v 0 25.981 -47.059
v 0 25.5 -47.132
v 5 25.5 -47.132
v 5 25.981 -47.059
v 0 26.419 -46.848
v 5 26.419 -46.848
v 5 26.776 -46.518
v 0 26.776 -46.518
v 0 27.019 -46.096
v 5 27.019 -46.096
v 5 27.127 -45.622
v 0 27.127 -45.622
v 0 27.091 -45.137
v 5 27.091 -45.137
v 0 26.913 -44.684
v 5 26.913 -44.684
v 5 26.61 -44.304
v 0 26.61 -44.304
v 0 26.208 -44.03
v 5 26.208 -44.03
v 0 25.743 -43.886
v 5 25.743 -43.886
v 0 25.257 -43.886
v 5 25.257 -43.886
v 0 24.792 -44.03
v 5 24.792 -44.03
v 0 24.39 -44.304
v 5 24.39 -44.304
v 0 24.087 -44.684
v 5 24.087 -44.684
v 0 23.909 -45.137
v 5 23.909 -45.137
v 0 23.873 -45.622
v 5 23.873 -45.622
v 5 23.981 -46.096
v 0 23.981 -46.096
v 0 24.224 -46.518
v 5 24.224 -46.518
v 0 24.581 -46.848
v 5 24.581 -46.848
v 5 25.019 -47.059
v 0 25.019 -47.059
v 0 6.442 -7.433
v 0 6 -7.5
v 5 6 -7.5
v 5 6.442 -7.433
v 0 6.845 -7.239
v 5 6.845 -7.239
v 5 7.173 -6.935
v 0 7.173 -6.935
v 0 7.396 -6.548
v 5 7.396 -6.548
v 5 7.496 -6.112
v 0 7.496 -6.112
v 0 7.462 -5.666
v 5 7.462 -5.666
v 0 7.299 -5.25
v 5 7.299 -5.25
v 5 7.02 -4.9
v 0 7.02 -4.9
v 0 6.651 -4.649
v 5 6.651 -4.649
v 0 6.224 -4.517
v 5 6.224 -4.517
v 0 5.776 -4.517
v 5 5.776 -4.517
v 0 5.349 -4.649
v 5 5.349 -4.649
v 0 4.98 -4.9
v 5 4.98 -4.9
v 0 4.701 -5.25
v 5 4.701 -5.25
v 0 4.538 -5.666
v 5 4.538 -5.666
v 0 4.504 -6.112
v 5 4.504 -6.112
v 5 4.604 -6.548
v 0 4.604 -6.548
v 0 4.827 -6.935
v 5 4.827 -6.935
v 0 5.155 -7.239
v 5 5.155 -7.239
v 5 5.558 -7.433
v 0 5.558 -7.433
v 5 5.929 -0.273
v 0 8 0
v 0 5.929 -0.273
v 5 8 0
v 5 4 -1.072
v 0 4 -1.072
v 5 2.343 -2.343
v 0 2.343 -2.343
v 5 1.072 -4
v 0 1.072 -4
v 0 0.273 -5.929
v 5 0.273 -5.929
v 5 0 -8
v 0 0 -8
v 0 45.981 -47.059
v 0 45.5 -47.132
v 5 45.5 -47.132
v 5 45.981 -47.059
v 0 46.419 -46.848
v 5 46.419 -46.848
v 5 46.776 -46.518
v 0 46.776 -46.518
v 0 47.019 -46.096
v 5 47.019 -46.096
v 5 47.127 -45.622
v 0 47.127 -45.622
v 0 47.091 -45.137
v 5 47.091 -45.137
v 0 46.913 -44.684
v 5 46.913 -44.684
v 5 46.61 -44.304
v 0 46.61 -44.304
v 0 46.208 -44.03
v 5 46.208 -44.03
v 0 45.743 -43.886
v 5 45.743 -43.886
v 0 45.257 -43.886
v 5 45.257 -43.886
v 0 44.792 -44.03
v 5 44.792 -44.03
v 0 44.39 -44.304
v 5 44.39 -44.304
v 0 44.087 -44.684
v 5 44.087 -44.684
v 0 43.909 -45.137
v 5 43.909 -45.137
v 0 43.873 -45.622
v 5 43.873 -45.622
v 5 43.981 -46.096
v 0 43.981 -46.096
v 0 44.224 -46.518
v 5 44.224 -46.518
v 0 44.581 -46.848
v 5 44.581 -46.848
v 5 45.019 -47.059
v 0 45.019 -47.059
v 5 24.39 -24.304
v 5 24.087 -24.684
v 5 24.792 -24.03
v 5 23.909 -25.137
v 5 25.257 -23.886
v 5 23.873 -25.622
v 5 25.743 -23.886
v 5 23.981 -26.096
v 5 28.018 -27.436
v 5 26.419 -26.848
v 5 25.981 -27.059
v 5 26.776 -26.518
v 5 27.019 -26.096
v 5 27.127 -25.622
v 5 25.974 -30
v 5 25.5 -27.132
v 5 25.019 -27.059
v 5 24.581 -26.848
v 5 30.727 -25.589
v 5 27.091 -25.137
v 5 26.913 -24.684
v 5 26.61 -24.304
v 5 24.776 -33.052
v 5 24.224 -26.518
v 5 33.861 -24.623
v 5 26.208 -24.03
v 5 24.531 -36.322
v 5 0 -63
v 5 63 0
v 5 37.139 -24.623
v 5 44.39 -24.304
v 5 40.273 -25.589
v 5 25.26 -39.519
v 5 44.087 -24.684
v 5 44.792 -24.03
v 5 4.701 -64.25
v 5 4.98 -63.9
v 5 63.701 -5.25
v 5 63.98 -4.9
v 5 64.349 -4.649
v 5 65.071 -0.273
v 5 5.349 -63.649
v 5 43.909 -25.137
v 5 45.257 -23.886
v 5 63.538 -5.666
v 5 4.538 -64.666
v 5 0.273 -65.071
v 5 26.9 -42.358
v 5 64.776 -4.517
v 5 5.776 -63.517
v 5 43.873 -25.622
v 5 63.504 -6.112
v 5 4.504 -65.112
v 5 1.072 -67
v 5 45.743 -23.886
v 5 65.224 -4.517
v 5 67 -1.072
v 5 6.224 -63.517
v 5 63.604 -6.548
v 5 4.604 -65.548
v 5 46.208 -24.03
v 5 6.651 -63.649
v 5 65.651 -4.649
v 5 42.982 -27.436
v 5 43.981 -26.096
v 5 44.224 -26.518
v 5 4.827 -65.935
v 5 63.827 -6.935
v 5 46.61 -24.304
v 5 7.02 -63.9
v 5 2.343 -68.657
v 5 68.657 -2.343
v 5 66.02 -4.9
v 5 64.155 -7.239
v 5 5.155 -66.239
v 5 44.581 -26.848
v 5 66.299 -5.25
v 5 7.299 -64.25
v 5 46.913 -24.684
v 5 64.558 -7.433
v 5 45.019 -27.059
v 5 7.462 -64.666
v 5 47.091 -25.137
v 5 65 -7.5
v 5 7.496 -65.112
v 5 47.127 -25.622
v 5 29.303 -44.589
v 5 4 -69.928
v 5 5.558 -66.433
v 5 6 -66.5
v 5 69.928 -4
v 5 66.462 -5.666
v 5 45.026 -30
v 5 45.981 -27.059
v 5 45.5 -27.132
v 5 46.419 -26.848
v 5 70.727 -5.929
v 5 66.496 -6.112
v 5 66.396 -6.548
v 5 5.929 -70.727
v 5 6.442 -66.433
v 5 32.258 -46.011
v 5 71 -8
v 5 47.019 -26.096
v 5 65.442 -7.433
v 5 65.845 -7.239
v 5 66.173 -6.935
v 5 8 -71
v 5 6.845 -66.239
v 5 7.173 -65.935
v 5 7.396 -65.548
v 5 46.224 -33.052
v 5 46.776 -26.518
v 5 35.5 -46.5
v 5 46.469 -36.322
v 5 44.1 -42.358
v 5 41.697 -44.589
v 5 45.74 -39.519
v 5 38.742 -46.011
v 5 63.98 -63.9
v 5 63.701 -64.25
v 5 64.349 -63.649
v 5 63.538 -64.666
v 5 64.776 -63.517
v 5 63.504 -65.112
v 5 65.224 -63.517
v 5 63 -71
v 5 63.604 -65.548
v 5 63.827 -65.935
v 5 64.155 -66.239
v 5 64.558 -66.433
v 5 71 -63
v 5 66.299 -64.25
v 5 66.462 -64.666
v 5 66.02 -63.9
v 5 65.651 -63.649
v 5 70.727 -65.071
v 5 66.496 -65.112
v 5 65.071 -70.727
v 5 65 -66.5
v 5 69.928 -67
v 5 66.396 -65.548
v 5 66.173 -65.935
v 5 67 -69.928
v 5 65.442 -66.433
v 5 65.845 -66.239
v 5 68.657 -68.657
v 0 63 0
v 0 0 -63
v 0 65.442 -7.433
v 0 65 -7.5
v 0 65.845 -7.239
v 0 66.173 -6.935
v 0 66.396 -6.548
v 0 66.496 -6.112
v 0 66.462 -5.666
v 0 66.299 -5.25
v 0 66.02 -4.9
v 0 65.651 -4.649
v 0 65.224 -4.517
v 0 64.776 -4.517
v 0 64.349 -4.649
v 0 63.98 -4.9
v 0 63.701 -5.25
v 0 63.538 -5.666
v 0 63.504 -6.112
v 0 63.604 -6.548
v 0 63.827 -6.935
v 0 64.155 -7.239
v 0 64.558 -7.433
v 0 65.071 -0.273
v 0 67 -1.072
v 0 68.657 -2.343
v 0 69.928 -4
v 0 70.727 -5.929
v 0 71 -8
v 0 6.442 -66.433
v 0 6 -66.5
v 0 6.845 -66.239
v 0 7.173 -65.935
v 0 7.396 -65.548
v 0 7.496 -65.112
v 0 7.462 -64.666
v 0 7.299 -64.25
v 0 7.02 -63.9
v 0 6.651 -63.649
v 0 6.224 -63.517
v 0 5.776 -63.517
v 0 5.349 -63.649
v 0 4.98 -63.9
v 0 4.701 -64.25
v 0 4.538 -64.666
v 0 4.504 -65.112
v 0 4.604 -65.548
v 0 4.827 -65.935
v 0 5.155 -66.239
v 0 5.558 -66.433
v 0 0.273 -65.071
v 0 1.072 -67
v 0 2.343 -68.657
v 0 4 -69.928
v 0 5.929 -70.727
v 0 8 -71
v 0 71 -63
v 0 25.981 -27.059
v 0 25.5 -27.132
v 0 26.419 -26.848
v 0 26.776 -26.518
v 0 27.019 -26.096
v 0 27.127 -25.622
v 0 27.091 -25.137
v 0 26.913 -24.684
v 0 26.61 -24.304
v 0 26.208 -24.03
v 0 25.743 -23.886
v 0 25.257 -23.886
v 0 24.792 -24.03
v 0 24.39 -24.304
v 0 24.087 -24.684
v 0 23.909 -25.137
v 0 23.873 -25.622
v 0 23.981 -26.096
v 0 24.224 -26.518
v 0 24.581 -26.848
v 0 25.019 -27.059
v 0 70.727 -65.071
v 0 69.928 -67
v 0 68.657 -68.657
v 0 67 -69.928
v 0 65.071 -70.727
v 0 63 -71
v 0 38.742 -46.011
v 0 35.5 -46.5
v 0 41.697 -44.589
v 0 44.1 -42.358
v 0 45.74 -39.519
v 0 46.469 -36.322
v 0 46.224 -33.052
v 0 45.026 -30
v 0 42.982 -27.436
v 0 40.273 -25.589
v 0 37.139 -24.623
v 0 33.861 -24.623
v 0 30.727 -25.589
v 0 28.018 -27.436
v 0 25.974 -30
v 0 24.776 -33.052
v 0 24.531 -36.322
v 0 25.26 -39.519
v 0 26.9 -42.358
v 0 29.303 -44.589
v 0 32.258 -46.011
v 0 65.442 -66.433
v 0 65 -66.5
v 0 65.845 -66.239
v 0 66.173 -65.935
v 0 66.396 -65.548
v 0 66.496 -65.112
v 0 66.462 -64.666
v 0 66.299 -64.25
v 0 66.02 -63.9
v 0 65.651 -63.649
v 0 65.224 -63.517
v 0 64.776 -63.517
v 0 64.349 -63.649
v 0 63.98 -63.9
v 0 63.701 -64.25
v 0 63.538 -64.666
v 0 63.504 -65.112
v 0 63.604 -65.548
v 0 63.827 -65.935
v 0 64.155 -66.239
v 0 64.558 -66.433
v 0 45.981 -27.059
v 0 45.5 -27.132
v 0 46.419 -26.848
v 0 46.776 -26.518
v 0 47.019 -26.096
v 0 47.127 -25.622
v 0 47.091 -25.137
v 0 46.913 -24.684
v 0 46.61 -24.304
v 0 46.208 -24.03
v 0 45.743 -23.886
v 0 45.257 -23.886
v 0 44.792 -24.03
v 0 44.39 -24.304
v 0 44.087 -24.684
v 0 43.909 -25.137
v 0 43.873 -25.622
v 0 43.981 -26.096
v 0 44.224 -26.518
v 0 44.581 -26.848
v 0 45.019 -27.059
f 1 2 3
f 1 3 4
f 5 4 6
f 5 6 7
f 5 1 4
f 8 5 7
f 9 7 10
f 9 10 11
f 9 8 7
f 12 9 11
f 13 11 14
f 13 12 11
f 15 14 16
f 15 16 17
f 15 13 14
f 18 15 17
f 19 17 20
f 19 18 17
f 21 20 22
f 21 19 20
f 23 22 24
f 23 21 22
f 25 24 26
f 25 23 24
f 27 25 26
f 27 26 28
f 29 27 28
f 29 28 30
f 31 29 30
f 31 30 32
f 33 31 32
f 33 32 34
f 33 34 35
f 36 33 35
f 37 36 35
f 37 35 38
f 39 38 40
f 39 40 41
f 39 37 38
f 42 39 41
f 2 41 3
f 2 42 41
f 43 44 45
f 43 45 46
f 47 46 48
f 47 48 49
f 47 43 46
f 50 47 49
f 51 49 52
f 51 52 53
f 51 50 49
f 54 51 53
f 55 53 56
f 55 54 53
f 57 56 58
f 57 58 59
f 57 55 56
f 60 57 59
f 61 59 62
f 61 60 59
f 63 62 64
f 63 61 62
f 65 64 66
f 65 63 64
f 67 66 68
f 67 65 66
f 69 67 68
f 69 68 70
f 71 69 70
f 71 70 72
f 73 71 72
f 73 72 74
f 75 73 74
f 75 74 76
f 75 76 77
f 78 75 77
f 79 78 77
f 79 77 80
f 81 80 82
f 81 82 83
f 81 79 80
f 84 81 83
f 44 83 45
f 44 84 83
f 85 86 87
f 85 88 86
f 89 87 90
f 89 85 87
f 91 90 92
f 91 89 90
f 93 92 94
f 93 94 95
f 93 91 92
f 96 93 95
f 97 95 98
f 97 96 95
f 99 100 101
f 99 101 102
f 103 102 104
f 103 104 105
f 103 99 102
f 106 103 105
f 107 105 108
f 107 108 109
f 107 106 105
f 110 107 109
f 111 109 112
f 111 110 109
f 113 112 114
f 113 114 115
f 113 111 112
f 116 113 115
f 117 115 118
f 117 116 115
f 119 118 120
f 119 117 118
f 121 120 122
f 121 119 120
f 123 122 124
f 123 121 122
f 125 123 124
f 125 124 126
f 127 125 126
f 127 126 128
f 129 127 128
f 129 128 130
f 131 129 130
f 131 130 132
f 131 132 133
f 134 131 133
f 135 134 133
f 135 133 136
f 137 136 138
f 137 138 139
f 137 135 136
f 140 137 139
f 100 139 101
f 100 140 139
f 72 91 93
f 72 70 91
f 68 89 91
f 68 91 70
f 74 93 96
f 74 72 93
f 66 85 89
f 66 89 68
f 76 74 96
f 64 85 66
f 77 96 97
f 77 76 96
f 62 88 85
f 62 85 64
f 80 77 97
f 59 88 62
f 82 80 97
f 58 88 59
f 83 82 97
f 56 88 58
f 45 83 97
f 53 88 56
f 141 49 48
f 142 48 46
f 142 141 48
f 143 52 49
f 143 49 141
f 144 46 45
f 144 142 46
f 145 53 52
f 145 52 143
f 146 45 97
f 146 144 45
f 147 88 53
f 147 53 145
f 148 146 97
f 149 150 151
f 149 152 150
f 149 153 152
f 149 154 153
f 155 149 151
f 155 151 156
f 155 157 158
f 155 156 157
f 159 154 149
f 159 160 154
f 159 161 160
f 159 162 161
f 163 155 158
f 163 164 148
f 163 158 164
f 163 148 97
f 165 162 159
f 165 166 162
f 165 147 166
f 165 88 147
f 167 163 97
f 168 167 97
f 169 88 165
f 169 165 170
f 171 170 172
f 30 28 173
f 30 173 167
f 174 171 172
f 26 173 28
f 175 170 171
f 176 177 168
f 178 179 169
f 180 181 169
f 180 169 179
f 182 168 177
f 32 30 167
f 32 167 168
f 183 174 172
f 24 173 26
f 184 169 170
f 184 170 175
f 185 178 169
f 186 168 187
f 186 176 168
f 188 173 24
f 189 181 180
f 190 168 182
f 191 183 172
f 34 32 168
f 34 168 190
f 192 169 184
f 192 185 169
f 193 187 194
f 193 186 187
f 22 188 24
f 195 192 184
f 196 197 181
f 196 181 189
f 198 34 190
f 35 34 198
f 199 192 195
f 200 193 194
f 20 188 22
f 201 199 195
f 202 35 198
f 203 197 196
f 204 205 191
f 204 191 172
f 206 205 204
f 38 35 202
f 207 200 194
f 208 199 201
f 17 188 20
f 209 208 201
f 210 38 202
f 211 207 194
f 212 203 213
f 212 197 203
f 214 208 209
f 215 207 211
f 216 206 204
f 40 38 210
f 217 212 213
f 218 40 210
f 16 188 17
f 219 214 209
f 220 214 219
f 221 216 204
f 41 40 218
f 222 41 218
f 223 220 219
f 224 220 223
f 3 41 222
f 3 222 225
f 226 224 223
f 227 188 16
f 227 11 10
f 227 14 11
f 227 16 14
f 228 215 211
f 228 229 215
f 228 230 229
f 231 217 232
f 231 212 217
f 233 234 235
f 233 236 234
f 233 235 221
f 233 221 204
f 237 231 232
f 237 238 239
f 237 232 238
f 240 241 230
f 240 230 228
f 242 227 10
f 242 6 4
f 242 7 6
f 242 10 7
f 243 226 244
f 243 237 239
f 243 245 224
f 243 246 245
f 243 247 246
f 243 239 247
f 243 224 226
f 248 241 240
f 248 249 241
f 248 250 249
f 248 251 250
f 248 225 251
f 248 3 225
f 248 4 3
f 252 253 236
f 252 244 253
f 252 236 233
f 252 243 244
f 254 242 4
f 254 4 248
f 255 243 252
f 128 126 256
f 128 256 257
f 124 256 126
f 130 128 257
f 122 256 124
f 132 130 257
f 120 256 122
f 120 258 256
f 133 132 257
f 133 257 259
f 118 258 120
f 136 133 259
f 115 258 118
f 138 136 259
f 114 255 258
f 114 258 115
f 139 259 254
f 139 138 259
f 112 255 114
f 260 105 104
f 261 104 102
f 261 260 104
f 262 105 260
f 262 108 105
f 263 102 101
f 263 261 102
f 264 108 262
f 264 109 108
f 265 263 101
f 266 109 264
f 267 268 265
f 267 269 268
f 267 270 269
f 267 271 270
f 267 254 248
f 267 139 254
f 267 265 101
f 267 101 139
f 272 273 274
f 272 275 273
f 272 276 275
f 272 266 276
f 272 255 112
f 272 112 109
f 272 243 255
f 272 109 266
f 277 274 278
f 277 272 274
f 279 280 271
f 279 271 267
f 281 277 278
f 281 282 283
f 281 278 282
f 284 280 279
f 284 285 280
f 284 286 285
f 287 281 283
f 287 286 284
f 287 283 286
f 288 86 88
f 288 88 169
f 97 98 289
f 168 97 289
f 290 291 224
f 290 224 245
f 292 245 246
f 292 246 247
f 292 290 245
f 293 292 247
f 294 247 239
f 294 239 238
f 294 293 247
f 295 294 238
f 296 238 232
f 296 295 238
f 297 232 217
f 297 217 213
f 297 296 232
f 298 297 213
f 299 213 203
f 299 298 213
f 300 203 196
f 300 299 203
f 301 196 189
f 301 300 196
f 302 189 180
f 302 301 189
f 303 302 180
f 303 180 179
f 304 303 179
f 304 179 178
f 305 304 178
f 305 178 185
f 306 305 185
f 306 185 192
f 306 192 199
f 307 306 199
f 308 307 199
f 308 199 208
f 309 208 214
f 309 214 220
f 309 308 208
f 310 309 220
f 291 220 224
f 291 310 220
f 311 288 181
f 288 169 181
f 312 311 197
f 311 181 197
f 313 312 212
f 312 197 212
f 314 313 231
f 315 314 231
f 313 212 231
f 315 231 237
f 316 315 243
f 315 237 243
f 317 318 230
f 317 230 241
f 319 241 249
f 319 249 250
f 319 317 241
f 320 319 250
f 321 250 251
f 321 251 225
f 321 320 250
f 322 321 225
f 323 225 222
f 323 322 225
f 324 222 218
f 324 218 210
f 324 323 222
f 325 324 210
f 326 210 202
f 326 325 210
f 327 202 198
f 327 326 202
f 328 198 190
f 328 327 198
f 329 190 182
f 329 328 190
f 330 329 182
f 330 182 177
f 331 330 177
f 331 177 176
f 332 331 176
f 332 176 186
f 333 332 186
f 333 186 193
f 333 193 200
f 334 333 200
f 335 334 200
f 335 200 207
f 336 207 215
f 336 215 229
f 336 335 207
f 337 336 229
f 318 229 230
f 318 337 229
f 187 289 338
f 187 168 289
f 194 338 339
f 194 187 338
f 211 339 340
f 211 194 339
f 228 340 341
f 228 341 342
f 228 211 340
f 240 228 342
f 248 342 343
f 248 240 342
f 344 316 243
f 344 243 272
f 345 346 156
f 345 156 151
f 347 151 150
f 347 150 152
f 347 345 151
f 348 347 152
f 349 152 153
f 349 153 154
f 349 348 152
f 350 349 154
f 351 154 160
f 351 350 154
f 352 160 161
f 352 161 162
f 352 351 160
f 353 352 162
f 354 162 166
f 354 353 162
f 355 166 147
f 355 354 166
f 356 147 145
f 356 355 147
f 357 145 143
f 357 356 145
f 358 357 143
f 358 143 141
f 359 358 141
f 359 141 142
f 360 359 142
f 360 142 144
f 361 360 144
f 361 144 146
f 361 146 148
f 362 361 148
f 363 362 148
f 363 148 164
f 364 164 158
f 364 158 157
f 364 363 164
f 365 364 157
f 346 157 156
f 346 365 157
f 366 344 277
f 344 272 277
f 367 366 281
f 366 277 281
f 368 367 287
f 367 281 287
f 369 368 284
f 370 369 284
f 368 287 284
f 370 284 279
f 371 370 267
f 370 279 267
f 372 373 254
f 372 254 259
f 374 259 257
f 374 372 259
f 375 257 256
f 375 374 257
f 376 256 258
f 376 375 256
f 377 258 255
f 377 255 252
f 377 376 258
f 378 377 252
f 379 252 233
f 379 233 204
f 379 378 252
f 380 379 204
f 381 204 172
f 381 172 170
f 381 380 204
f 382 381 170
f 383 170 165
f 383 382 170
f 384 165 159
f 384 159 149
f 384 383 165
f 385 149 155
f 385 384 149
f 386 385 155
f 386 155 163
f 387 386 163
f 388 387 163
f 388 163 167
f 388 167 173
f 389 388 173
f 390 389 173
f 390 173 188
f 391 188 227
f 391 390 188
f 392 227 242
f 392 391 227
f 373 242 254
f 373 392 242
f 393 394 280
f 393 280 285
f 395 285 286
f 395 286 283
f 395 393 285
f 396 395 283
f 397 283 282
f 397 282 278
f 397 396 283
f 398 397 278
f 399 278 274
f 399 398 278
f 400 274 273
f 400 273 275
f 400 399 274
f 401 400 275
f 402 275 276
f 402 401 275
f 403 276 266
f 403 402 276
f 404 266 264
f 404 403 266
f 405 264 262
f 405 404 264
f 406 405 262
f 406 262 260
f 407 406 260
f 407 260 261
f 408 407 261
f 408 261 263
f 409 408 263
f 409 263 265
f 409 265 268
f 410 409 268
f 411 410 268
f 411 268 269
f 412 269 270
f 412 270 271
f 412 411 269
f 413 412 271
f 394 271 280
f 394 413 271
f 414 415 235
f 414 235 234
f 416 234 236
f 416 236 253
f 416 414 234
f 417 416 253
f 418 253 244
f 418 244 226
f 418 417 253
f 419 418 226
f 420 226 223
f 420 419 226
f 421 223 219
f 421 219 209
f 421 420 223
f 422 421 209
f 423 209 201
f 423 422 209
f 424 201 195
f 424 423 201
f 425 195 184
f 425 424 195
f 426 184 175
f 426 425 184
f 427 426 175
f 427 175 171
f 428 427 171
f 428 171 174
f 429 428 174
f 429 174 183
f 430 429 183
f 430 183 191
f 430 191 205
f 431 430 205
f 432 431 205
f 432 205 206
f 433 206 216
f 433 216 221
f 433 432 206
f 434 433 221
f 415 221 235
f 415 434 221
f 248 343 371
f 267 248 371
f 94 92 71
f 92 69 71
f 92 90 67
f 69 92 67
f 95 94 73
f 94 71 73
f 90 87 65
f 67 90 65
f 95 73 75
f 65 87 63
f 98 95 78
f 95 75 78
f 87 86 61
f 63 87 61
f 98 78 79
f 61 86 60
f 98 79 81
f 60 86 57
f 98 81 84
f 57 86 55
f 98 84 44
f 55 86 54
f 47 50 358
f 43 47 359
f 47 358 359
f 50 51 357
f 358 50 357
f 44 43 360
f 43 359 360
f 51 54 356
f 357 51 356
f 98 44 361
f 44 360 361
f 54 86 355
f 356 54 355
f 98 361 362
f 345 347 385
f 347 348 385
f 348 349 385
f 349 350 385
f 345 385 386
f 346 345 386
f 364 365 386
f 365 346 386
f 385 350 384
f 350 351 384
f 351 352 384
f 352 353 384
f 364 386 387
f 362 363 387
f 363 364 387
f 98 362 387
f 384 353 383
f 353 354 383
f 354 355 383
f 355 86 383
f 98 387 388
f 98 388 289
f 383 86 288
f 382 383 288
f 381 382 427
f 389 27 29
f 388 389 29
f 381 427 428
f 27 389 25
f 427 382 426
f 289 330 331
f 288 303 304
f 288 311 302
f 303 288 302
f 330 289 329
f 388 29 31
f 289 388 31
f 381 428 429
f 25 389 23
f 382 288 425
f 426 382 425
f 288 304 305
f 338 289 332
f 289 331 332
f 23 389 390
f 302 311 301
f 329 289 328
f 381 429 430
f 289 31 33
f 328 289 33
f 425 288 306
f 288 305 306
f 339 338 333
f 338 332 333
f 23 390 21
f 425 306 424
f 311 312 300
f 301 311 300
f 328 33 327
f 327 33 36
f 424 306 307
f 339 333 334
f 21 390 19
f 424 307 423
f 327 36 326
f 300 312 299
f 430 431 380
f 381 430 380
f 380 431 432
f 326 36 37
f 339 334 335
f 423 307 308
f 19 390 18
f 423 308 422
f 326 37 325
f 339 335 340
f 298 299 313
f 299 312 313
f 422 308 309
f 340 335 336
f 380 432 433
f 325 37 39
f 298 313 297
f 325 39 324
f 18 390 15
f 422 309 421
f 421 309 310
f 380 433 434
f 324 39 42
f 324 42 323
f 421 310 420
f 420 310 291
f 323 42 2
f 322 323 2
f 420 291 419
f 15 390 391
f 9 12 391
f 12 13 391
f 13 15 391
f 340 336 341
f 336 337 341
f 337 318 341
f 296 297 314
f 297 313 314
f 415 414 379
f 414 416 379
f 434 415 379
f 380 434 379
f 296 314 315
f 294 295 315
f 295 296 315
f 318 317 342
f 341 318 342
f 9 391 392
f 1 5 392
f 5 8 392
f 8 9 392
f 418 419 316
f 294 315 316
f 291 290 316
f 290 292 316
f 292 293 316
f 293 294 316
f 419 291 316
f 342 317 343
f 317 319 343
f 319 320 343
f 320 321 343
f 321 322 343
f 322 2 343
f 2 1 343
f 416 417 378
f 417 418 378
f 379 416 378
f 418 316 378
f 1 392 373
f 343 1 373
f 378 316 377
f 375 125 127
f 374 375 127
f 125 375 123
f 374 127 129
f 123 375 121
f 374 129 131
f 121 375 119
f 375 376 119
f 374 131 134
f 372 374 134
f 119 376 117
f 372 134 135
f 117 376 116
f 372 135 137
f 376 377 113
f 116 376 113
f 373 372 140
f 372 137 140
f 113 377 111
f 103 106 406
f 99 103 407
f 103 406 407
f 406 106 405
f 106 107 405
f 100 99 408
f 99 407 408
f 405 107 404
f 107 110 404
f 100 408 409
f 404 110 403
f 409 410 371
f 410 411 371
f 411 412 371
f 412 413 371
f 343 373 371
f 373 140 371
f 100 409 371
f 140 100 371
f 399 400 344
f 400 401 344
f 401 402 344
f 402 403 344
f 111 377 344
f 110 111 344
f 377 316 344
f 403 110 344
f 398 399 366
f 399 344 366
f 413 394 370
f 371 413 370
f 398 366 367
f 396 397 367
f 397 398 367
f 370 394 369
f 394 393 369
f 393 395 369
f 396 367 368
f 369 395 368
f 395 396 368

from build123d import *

# Parameters (mm, degrees)
SKETCH1_W           = 71
SKETCH1_H           = 71
SKETCH1_R           = 1.5
SKETCH1_R_2         = 11
SKETCH1_R_3         = 1.631951877
BOSS_EXTRUDE1_DEPTH = 5
FILLET1_R           = 8


with BuildPart() as part:
    # Sketch1 → Boss-Extrude1 (new body)
    with BuildSketch(Plane(origin=(0, 0, 0), x_dir=(0, 0, -1), z_dir=(1, 0, 0))):
        with Locations((35.5, 35.5)):
            Rectangle(SKETCH1_W, SKETCH1_H)
        with Locations((6, 6)):
            Circle(SKETCH1_R, mode=Mode.SUBTRACT)
        with Locations((6, 65)):
            Circle(SKETCH1_R, mode=Mode.SUBTRACT)
        with Locations((65, 65)):
            Circle(SKETCH1_R, mode=Mode.SUBTRACT)
        with Locations((65, 6)):
            Circle(SKETCH1_R, mode=Mode.SUBTRACT)
        with Locations((35.5, 35.5)):
            Circle(SKETCH1_R_2, mode=Mode.SUBTRACT)
        with Locations((25.5, 45.5)):
            Circle(SKETCH1_R_3, mode=Mode.SUBTRACT)
        with Locations((45.5, 45.5)):
            Circle(SKETCH1_R_3, mode=Mode.SUBTRACT)
        with Locations((25.5, 25.5)):
            Circle(SKETCH1_R_3, mode=Mode.SUBTRACT)
        with Locations((45.5, 25.5)):
            Circle(SKETCH1_R_3, mode=Mode.SUBTRACT)
    extrude(amount=BOSS_EXTRUDE1_DEPTH)

    # Fillet1
    fillet1_edges = [part.edges().sort_by_distance(p)[0] for p in [
        (2.5, 71, 0),
        (2.5, 71, -71),
        (2.5, 0, -71),
        (2.5, 0, 0),
    ]]
    fillet(fillet1_edges, radius=FILLET1_R)


solid = part.part
